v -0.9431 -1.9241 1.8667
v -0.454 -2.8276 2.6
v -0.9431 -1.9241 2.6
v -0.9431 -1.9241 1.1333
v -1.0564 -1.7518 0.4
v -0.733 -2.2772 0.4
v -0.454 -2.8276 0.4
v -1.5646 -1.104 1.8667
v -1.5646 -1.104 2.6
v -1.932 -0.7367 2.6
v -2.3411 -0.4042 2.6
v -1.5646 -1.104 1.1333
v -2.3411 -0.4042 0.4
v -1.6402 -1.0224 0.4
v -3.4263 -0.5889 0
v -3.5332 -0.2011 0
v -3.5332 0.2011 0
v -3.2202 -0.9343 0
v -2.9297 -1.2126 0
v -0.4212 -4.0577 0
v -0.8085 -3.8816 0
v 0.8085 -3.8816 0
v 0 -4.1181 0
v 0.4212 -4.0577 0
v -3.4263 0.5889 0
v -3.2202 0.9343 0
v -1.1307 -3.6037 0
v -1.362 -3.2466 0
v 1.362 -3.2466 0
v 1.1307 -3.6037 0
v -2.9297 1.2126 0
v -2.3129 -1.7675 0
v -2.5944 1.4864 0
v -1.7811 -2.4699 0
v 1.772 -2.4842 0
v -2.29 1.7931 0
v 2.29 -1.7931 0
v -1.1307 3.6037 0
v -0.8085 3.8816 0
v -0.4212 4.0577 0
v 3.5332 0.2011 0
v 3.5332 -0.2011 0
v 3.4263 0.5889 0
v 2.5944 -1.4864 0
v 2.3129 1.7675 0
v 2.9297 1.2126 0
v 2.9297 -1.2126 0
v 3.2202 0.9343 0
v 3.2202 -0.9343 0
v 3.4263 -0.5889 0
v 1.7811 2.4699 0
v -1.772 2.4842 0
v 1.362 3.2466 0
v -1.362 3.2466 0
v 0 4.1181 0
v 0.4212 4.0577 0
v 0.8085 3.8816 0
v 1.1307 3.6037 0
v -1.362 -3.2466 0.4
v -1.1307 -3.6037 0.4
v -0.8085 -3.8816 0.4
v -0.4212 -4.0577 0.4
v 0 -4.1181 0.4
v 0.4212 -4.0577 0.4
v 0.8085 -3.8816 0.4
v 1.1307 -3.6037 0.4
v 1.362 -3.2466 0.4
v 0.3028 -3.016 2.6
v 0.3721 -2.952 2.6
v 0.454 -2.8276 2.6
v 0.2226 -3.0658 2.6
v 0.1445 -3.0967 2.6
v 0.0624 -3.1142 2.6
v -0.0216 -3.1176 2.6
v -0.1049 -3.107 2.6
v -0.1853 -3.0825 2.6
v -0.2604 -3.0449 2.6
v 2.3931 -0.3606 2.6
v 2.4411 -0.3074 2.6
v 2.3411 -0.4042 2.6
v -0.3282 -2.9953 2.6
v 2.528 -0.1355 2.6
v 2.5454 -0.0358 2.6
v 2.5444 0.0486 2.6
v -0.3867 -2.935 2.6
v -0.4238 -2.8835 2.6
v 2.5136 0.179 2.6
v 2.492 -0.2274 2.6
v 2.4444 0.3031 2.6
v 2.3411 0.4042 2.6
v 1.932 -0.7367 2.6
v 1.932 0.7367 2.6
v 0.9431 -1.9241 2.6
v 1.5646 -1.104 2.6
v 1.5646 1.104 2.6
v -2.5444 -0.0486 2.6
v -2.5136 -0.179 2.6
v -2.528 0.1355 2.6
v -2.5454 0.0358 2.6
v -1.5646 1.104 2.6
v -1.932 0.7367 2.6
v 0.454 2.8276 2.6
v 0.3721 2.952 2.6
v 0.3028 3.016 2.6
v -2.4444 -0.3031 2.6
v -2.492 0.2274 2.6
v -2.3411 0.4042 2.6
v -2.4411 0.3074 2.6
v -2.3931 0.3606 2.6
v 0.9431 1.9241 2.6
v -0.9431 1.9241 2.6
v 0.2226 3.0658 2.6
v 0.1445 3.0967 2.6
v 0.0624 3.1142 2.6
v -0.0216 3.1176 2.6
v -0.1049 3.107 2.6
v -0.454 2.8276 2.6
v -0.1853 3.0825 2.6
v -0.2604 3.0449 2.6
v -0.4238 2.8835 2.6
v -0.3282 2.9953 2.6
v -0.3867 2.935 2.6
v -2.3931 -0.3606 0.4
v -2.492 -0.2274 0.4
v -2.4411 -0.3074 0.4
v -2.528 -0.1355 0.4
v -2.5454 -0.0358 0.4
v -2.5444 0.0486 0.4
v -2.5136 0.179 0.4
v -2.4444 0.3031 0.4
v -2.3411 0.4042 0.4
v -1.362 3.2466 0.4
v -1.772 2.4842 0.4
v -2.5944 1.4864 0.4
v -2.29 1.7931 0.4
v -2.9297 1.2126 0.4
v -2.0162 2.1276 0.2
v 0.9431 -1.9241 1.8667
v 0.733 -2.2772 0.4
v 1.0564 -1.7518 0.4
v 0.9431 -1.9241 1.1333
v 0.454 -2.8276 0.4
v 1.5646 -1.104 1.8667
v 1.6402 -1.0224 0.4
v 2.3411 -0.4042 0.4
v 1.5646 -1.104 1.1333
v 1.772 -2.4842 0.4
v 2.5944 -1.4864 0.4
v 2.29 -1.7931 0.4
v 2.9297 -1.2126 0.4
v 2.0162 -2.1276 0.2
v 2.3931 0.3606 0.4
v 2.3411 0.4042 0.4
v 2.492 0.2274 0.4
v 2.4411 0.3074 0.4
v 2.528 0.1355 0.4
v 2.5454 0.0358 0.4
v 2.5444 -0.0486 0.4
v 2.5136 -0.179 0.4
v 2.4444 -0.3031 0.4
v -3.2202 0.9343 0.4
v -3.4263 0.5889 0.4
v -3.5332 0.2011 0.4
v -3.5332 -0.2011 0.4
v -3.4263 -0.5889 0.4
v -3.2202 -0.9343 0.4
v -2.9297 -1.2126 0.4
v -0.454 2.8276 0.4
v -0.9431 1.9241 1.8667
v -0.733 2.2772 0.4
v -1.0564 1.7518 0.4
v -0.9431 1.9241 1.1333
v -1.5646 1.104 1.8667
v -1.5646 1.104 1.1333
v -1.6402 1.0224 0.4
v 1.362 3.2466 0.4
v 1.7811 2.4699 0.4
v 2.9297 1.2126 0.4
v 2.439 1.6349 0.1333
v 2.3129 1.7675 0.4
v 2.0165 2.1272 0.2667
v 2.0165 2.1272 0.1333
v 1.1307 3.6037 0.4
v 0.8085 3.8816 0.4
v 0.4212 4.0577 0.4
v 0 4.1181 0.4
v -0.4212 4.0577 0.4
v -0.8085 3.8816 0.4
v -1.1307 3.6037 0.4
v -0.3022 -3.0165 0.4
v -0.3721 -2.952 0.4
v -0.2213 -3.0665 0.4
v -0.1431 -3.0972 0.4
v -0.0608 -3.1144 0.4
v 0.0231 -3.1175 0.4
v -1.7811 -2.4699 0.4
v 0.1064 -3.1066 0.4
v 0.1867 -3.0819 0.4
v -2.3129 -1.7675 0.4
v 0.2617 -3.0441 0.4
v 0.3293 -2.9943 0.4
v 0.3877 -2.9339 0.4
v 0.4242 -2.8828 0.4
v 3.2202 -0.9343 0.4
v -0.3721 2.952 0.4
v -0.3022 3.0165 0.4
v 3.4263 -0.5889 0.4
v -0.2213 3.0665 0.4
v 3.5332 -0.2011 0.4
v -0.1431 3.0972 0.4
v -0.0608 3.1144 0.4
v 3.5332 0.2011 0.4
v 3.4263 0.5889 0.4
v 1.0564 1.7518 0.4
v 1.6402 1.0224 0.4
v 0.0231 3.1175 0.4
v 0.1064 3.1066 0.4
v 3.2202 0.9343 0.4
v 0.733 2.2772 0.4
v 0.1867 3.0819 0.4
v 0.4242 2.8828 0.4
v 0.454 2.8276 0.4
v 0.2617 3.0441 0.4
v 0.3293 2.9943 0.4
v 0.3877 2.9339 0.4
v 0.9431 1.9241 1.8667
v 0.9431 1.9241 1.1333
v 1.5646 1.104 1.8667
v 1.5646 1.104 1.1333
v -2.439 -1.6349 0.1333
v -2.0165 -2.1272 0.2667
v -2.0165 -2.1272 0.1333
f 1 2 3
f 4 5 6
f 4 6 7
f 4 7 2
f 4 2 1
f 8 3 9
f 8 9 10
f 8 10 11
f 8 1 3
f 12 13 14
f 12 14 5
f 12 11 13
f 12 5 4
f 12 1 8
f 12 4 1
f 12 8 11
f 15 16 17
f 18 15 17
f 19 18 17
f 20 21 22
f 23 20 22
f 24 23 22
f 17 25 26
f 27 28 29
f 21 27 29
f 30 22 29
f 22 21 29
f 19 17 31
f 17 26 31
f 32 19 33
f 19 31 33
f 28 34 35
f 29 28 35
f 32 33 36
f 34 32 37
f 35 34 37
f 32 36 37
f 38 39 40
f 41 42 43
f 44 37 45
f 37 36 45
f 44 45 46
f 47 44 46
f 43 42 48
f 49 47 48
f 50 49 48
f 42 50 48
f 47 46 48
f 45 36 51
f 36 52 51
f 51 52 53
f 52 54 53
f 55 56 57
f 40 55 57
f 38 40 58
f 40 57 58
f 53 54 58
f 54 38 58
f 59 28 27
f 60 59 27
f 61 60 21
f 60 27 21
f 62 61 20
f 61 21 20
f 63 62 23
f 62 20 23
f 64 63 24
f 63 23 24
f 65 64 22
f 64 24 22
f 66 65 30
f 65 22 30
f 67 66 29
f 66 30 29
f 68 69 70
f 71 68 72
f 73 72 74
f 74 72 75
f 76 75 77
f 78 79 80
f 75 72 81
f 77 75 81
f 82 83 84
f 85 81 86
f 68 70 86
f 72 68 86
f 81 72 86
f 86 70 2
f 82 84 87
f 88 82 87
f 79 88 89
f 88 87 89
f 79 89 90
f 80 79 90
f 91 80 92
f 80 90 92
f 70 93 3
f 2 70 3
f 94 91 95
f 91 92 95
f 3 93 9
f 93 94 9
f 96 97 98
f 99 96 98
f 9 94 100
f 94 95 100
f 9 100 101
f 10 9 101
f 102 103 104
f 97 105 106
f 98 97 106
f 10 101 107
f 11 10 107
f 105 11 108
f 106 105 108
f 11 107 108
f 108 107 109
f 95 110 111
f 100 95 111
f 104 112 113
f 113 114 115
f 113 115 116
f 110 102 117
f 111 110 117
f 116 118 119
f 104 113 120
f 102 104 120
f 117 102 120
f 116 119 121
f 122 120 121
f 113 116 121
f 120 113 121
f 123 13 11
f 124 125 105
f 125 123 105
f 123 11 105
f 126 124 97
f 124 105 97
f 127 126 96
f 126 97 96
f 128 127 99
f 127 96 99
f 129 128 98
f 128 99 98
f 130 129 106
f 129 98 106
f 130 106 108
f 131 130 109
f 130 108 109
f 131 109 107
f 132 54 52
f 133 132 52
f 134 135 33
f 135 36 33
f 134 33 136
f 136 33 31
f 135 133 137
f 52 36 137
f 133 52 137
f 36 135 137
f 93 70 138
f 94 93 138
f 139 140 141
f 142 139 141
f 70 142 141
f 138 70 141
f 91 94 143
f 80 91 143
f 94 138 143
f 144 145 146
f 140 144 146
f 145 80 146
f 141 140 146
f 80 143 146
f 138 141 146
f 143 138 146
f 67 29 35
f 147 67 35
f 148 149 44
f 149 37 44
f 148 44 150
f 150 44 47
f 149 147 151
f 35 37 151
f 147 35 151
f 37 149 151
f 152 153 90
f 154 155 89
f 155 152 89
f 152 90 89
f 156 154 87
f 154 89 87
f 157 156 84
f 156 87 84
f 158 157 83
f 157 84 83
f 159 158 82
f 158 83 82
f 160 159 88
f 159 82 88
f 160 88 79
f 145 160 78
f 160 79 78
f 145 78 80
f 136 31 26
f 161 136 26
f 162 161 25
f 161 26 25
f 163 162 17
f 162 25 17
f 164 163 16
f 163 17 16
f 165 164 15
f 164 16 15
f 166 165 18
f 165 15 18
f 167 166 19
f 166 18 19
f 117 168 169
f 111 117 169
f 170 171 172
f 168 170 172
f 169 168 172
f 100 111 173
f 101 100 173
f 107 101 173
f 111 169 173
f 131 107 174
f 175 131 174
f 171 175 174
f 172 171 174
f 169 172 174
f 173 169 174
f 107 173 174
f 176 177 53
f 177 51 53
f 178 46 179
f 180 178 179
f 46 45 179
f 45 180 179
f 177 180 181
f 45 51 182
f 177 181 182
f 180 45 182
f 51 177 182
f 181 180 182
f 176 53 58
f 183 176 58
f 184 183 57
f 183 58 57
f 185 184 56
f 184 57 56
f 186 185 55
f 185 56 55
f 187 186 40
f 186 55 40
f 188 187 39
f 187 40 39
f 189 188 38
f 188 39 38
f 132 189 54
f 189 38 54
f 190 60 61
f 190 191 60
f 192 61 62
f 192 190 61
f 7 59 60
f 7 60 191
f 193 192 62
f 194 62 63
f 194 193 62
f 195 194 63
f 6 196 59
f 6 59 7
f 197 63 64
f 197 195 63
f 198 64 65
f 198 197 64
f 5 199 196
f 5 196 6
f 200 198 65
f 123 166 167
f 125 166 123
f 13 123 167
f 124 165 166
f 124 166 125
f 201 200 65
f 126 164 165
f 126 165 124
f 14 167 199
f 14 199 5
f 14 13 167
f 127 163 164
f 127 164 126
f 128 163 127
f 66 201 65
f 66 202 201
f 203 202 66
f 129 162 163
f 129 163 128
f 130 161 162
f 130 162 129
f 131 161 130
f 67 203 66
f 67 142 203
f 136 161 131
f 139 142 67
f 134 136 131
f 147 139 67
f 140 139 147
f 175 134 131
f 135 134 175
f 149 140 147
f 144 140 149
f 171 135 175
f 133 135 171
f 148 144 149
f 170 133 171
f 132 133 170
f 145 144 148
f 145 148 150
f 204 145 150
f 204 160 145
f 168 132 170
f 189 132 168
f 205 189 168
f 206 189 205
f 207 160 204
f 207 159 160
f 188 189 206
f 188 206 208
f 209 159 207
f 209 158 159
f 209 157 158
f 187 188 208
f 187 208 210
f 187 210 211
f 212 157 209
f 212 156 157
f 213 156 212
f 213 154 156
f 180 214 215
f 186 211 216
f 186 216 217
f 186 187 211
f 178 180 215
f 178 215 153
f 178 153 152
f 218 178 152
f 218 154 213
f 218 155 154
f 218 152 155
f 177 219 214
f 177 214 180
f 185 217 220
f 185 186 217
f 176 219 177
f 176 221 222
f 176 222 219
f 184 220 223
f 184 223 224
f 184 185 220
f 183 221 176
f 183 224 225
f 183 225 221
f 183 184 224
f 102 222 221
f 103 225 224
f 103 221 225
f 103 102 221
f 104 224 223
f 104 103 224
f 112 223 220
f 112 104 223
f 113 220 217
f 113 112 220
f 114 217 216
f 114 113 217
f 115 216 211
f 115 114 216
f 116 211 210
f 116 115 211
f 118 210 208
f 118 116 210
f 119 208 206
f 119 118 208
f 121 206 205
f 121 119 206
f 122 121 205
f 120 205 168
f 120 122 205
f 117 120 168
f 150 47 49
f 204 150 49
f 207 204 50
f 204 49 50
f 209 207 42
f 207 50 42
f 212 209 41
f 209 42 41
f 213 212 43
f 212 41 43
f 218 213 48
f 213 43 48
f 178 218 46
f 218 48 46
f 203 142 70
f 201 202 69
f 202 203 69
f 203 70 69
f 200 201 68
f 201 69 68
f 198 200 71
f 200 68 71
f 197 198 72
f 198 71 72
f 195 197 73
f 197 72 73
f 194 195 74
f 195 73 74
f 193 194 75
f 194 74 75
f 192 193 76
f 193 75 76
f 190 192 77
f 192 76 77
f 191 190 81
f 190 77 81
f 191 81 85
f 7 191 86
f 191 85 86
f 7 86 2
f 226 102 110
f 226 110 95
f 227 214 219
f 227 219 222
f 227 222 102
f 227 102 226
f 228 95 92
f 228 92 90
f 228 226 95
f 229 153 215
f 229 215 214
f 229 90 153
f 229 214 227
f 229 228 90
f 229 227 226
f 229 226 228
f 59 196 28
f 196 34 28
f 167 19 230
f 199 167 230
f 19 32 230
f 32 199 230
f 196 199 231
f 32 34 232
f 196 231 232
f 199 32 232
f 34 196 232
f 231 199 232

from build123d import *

# Parameters (mm, degrees)
BOSS_EXTRUDE1_DEPTH = 2.6
FILLET1_R           = 0.5
BOSS_EXTRUDE2_DEPTH = 0.4


with BuildPart() as part:
    # Sketch4 → Boss-Extrude1 (new body)
    with BuildSketch(Plane.XY):
        with BuildLine():
            add(Edge.make_bspline(
                [(0, 4), (0.515028324, 2.414905806), (1.36313107, 0.834026377), (3, 0)],
                knots=[0, 0, 0, 0, 1, 1, 1, 1], degree=3))
            add(Edge.make_bspline(
                [(0, -4), (0.515028324, -2.414905806), (1.36313107, -0.834026377), (3, 0)],
                knots=[0, 0, 0, 0, 1, 1, 1, 1], degree=3))
            add(Edge.make_bspline(
                [(0, -4), (-0.515028324, -2.414905806), (-1.36313107, -0.834026377), (-3, 0)],
                knots=[0, 0, 0, 0, 1, 1, 1, 1], degree=3))
            add(Edge.make_bspline(
                [(0, 4), (-0.515028324, 2.414905806), (-1.36313107, 0.834026377), (-3, 0)],
                knots=[0, 0, 0, 0, 1, 1, 1, 1], degree=3))
        make_face()
    extrude(amount=BOSS_EXTRUDE1_DEPTH)

    # Fillet1
    fillet1_edges = [part.edges().sort_by_distance(p)[0] for p in [
        (0, -4, 1.3),
        (-3, 0, 1.3),
        (3, 0, 1.3),
        (0, 4, 1.3),
    ]]
    fillet(fillet1_edges, radius=FILLET1_R)

    # Sketch5 → Boss-Extrude2 (add)
    with BuildSketch(Plane.XY):
        with BuildLine():
            ThreePointArc((-2.929739435, 1.212558746), (-3.546732478, 0), (-2.929739435, -1.212558746))
            add(Edge.make_bspline(
                [(-2.929739435, -1.212558746), (-2.754213175, -1.340380107), (-2.591067356, -1.481611947), (-2.286979377, -1.788126606), (-2.14580641, -1.953887397), (-1.757808942, -2.473821282), (-1.543643929, -2.852932461), (-1.361963313, -3.246613691)],
                knots=[0, 0, 0, 0, 0.25, 0.25, 0.5, 0.5, 1, 1, 1, 1], degree=3))
            ThreePointArc((-1.361963313, -3.246613691), (0, -4.118078938), (1.361963313, -3.246613691))
            add(Edge.make_bspline(
                [(1.361963313, -3.246613691), (1.543598049, -2.853031879), (1.757635539, -2.47411695), (2.274781933, -1.780991218), (2.578788315, -1.468127627), (2.929739435, -1.212558746)],
                knots=[0, 0, 0, 0, 0.5, 0.5, 1, 1, 1, 1], degree=3))
            ThreePointArc((2.929739435, -1.212558746), (3.546732478, 0), (2.929739435, 1.212558746))
            add(Edge.make_bspline(
                [(2.929739435, 1.212558746), (2.754213175, 1.340380107), (2.591067356, 1.481611947), (2.286979377, 1.788126606), (2.14580641, 1.953887397), (1.757808942, 2.473821282), (1.543643929, 2.852932461), (1.361963313, 3.246613691)],
                knots=[0, 0, 0, 0, 0.25, 0.25, 0.5, 0.5, 1, 1, 1, 1], degree=3))
            ThreePointArc((1.361963313, 3.246613691), (0, 4.118078938), (-1.361963313, 3.246613691))
            add(Edge.make_bspline(
                [(-1.361963313, 3.246613691), (-1.543598049, 2.853031879), (-1.757635539, 2.47411695), (-2.274781933, 1.780991218), (-2.578788315, 1.468127627), (-2.929739435, 1.212558746)],
                knots=[0, 0, 0, 0, 0.5, 0.5, 1, 1, 1, 1], degree=3))
        make_face()
    extrude(amount=BOSS_EXTRUDE2_DEPTH)


solid = part.part
